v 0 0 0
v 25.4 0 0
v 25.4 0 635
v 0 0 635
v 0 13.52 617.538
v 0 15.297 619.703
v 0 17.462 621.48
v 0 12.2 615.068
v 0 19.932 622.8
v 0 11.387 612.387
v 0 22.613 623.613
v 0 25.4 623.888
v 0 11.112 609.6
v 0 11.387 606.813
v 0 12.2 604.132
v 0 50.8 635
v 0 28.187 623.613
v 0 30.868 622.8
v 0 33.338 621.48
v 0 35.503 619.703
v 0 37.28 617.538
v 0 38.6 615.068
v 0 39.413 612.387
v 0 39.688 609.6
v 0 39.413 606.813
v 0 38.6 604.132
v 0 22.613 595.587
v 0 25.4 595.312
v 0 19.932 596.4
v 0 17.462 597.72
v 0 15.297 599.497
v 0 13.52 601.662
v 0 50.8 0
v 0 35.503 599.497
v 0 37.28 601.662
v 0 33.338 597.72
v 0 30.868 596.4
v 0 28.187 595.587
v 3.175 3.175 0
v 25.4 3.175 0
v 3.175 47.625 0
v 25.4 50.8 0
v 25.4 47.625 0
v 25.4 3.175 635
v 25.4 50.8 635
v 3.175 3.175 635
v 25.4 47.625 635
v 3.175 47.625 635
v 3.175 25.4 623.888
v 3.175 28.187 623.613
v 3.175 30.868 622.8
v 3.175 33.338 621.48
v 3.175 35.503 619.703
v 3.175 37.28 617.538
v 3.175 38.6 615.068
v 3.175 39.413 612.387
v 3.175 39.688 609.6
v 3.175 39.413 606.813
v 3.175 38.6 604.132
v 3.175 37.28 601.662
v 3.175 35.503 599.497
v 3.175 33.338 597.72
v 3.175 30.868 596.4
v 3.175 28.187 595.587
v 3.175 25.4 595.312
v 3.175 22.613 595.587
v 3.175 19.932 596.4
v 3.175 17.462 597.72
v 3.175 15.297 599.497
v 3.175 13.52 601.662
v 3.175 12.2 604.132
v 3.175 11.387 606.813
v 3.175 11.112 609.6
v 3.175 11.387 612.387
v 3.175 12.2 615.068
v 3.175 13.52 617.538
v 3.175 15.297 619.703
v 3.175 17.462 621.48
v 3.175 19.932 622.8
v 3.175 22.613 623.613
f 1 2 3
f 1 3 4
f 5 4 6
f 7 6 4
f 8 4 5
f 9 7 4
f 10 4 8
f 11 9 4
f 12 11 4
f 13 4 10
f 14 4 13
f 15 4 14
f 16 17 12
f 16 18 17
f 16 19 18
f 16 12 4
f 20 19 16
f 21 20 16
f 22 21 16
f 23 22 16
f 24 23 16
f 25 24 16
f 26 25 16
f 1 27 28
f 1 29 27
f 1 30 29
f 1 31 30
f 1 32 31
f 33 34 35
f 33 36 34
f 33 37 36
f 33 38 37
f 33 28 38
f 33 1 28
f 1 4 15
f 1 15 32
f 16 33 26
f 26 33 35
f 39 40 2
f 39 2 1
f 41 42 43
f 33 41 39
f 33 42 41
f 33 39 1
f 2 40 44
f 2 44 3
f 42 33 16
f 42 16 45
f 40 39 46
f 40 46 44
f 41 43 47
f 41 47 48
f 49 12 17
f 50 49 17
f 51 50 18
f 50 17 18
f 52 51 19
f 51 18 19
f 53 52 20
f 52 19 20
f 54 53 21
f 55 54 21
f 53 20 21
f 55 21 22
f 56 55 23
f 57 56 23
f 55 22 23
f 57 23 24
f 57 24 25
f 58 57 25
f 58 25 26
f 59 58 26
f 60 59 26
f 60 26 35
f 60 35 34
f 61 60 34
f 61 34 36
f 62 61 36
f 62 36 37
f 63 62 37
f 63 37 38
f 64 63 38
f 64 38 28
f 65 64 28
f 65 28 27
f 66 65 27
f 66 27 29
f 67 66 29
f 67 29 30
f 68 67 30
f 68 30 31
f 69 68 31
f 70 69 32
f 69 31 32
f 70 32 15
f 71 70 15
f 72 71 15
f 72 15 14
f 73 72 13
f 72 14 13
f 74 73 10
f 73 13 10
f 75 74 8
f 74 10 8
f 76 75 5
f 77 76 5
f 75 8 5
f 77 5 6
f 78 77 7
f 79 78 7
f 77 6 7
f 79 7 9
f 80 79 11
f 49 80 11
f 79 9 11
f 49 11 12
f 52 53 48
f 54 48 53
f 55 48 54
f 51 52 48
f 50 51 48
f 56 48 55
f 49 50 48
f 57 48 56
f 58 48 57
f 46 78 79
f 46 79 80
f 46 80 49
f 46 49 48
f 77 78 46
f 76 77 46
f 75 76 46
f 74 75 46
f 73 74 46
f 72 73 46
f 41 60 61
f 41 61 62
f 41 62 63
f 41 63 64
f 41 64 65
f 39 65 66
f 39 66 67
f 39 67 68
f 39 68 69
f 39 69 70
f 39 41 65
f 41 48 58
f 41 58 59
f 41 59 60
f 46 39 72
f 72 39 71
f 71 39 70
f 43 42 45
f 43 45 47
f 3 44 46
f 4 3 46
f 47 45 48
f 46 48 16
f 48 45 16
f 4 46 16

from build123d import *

# Parameters (mm, degrees)
BOSS_EXTRUDE1_DEPTH = 635
SKETCH2_R           = 14.2875
CUT_EXTRUDE1_DEPTH  = 26.4


with BuildPart() as part:
    # Sketch1 → Boss-Extrude1 (new body)
    with BuildSketch(Plane.XY):
        Polygon((0, 0), (0, 50.8), (25.4, 50.8), (25.4, 47.625), (3.175, 47.625), (3.175, 3.175), (25.4, 3.175), (25.4, 0), align=None)
    extrude(amount=BOSS_EXTRUDE1_DEPTH)

    # Sketch2 → Cut-Extrude1 (cut, through all)
    with BuildSketch(Plane.ZY):
        with Locations((609.6, 25.4)):
            Circle(SKETCH2_R)
    extrude(amount=-CUT_EXTRUDE1_DEPTH, mode=Mode.SUBTRACT)


solid = part.part
